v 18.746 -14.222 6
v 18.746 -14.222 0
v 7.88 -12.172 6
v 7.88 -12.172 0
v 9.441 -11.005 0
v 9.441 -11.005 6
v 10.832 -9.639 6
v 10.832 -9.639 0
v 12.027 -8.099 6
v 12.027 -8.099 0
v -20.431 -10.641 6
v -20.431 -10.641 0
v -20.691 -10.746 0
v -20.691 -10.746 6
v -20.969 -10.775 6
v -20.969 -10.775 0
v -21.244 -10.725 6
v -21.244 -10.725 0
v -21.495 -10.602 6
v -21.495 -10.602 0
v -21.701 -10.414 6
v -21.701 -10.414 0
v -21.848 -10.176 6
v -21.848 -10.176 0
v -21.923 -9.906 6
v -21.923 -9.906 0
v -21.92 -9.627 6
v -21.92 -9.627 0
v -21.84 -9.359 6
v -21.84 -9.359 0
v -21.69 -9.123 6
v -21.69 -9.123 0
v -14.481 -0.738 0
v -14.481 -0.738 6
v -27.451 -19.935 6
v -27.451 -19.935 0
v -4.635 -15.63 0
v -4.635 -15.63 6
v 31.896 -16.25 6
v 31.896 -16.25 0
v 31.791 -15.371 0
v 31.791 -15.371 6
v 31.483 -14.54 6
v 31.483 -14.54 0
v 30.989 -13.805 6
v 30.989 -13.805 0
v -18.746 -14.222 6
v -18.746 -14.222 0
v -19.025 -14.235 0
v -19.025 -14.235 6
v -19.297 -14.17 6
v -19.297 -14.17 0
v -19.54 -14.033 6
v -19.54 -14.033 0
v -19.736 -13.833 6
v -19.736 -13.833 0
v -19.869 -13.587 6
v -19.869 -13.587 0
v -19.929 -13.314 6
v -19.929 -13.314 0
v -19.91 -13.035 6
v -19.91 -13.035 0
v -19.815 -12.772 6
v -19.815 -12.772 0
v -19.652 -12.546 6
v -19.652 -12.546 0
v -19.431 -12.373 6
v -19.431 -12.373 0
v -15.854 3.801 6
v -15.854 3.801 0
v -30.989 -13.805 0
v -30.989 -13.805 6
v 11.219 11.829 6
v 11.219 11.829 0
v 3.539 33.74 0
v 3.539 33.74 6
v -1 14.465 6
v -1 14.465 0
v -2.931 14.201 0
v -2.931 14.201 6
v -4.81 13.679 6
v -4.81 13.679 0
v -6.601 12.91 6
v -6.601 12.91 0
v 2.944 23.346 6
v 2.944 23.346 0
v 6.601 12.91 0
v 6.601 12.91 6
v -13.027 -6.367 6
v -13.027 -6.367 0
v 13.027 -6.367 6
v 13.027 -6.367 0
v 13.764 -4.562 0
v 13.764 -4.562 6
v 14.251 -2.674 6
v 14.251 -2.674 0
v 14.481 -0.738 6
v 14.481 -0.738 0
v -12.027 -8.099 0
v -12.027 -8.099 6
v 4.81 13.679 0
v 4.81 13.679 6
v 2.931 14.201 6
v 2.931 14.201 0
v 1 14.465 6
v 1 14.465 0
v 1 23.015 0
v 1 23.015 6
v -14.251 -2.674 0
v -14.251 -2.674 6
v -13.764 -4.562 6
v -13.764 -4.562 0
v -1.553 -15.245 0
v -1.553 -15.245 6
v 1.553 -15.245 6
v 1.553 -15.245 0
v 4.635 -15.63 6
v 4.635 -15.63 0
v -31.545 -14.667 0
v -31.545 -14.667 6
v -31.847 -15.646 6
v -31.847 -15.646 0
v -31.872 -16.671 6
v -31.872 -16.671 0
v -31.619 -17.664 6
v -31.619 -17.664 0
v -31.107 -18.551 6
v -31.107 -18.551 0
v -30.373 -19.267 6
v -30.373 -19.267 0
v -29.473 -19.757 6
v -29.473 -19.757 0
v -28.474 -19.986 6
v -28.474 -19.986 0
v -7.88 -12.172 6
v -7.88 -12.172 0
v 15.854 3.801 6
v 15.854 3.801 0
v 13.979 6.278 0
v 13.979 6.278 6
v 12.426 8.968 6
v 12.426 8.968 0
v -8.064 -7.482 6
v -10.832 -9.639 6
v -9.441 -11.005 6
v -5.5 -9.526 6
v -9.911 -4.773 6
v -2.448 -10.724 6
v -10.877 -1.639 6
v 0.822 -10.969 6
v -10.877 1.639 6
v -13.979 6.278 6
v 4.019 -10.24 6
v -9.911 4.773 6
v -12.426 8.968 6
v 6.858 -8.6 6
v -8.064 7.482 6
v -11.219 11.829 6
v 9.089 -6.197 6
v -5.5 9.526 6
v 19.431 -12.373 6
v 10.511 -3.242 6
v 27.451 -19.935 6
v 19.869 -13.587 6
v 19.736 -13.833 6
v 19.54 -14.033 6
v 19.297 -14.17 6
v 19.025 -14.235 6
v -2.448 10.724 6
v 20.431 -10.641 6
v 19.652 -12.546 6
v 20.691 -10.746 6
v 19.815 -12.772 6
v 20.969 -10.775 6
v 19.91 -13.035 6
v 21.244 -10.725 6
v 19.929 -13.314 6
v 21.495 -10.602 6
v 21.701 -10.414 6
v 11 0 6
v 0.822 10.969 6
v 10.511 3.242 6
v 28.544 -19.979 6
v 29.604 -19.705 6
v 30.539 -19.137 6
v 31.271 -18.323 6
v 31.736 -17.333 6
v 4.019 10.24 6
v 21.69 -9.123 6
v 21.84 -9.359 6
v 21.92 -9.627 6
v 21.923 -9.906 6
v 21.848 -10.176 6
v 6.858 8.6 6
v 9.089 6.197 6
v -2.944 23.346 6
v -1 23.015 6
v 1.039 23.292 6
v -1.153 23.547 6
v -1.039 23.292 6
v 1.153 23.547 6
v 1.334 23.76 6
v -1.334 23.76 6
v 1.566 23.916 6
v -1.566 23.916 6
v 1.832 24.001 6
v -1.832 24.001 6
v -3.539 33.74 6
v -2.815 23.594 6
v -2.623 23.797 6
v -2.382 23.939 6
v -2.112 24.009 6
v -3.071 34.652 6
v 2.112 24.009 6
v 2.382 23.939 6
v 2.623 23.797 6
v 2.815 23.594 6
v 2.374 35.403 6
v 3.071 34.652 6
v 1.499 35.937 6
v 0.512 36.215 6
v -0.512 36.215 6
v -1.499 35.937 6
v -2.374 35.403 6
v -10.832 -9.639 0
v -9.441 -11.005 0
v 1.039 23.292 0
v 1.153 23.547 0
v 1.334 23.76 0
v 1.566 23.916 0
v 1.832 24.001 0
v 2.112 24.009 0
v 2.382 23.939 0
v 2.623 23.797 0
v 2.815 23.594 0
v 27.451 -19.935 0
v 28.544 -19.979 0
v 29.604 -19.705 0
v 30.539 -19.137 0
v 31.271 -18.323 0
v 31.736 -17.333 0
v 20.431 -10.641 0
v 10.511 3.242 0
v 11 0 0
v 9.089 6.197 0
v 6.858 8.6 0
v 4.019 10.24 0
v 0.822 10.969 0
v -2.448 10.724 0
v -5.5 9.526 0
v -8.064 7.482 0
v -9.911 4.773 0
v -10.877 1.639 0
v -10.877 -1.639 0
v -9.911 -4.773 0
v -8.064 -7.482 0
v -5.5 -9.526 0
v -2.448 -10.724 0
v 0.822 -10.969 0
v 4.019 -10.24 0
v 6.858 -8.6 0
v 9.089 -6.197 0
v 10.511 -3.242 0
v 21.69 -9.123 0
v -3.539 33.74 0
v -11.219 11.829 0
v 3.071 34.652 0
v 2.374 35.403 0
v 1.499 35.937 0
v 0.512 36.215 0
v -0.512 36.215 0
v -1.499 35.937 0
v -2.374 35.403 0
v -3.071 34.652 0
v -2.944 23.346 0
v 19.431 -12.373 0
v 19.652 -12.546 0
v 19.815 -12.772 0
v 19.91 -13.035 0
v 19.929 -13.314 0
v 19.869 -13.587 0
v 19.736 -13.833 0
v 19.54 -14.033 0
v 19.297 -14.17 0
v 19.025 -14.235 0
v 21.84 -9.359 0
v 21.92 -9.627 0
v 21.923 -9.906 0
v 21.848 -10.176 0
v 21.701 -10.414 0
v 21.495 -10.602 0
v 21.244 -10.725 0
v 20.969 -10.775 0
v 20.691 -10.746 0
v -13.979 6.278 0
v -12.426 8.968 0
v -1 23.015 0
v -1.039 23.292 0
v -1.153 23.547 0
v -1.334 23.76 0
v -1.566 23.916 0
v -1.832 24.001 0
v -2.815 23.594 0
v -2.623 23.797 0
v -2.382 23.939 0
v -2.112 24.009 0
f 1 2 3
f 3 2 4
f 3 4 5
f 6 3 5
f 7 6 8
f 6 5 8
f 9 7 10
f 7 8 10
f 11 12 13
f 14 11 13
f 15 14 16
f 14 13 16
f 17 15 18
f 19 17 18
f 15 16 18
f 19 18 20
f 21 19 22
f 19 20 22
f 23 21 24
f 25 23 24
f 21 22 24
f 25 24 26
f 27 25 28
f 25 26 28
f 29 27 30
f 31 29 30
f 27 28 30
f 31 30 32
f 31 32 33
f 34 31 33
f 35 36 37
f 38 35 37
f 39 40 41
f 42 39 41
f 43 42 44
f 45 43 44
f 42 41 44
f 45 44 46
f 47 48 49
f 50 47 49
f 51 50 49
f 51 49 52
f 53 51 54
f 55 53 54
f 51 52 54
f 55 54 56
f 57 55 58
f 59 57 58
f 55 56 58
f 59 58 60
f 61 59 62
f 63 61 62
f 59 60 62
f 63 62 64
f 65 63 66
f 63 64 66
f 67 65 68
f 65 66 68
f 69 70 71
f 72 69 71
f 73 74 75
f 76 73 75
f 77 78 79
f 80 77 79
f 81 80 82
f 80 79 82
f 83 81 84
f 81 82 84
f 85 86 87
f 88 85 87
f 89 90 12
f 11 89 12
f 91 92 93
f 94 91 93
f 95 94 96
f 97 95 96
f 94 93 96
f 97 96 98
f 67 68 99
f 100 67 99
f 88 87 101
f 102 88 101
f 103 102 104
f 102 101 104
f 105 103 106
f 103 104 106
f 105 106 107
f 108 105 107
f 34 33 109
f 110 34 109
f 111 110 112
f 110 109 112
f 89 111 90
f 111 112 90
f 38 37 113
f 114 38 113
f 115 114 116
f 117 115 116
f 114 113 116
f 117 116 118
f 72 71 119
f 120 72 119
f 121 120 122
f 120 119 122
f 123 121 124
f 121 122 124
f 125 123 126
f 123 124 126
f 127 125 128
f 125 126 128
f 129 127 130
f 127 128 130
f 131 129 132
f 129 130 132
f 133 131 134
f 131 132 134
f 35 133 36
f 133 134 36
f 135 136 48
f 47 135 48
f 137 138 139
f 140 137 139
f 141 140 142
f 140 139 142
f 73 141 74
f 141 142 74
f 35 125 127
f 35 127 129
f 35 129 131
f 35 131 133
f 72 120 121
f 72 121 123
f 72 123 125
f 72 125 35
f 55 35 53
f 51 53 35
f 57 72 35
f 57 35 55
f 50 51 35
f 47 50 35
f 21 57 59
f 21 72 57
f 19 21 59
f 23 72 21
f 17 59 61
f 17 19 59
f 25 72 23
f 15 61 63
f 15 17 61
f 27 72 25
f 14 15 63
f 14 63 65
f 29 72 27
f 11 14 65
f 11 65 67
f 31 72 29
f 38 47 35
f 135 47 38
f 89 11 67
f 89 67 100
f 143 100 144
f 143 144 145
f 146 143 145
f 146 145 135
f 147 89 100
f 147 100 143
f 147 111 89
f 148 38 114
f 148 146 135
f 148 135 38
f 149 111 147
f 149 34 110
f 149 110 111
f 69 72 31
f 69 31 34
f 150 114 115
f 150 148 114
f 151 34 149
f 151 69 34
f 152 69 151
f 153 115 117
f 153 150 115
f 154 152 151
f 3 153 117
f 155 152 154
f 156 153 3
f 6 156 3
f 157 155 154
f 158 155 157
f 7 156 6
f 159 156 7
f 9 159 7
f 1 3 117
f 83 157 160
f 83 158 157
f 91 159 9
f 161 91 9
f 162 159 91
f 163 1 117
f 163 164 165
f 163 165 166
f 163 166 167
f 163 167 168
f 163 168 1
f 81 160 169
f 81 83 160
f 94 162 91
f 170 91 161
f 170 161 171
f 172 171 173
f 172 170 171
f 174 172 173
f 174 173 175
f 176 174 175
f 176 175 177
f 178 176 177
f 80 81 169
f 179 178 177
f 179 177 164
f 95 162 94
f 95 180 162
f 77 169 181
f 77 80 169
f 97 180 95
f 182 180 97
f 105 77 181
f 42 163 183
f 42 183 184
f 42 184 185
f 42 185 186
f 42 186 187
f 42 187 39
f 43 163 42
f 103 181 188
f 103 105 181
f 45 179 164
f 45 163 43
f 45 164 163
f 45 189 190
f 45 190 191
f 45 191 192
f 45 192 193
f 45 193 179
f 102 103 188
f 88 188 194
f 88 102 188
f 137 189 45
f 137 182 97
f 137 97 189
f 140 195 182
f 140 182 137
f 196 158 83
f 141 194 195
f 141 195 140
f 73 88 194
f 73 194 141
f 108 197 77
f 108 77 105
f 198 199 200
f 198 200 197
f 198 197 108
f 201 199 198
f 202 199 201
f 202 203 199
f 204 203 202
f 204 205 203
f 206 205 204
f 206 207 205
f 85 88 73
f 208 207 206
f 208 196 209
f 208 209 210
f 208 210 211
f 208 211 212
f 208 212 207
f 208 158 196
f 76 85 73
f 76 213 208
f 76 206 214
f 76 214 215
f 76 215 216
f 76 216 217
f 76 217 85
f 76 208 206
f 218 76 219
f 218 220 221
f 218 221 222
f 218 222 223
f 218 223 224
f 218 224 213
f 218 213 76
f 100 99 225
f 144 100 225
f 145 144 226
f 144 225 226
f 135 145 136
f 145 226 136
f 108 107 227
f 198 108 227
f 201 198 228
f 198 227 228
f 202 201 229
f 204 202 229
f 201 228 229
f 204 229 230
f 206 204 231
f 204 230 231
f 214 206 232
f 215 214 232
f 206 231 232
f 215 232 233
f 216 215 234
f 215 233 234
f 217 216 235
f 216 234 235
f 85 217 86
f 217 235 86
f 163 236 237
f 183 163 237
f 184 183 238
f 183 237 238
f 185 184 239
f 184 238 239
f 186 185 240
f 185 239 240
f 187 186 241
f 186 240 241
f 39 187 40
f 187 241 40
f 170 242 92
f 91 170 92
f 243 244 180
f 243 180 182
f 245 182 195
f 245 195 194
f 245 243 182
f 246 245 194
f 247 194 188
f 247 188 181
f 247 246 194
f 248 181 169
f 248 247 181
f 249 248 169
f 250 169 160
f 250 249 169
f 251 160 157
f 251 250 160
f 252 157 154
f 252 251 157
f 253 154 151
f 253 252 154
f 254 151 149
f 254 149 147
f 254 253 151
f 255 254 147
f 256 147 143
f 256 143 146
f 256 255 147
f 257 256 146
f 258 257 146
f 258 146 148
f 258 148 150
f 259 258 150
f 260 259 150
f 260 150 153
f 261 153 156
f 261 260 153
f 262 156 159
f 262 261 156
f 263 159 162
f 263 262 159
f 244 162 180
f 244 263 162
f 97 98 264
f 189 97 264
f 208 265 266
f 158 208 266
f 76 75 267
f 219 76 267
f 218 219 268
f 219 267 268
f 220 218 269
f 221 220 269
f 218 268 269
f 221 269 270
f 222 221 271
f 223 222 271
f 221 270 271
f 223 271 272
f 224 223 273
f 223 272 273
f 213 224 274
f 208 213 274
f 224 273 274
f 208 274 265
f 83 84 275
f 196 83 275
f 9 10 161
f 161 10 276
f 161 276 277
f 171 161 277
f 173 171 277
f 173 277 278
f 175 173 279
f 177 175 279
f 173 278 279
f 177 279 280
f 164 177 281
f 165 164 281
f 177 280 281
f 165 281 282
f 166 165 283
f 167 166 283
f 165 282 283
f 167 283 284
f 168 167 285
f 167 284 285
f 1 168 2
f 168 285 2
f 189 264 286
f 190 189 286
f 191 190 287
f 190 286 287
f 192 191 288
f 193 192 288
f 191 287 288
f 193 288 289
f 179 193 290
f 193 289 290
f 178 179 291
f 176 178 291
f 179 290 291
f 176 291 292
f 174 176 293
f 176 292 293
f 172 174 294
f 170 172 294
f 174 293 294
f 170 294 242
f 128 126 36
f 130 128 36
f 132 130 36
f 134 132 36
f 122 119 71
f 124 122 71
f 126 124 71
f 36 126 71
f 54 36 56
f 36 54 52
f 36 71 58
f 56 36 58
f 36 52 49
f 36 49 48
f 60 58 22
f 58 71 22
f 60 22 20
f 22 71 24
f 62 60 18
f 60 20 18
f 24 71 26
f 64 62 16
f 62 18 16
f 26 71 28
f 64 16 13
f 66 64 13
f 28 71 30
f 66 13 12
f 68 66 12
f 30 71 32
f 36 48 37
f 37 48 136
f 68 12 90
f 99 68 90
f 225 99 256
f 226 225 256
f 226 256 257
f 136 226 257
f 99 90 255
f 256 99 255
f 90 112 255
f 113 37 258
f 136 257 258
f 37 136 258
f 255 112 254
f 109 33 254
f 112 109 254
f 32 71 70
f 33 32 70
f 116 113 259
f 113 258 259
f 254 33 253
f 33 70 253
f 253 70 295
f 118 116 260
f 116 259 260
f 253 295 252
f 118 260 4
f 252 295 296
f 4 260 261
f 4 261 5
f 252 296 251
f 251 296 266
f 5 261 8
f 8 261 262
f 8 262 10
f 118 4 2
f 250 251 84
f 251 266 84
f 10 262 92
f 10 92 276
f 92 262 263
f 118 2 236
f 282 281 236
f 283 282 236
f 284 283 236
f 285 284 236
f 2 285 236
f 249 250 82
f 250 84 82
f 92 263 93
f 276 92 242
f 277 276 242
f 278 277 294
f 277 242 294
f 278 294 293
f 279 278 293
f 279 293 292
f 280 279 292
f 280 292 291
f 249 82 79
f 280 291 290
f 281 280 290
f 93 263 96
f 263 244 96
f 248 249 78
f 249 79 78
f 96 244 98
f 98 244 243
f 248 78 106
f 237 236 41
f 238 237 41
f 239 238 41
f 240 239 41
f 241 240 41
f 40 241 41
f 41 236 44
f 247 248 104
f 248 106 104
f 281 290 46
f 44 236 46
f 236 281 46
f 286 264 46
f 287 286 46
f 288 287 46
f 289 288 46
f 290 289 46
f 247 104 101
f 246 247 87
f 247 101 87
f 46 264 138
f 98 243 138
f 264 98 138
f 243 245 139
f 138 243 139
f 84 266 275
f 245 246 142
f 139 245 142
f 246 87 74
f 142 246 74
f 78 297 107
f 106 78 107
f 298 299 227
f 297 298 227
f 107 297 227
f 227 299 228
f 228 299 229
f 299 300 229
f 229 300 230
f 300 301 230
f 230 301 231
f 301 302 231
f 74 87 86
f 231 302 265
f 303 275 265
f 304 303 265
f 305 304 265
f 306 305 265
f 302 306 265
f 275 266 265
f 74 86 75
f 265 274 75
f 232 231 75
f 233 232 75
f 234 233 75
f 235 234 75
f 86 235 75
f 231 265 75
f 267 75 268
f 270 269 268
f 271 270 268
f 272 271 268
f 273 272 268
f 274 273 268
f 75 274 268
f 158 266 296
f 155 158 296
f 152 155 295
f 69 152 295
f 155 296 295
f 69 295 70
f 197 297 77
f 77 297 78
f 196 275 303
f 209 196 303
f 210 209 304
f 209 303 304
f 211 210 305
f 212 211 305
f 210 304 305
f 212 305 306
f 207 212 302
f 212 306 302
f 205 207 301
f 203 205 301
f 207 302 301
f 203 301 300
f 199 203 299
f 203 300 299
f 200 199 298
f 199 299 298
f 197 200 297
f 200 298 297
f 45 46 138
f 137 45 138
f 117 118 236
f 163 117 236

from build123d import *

# Parameters (mm, degrees)
F0_R     = 11
F1_DEPTH = 6


with BuildPart() as f1:
    # F0 (on Top) → F1 (new body)
    with BuildSketch(Plane.XY):
        with BuildLine():
            Line((11.2187429189, 11.8292181419), (3.5389187623, 33.7403846154))
            ThreePointArc((3.5389187623, 33.7403846154), (0, 36.25), (-3.5389187623, 33.7403846154))
            Line((-3.5389187623, 33.7403846154), (-11.2187429189, 11.8292181419))
            ThreePointArc((-11.2187429189, 11.8292181419), (-13.1608995727, 7.5984489111), (-15.8537748772, 3.8011072954))
            Line((-15.8537748772, 3.8011072954), (-30.9894895915, -13.8053987576))
            ThreePointArc((-30.9894895915, -13.8053987576), (-28.3703151015, -12.5067254343), (-25.6147048476, -13.4830653025))
            ThreePointArc((-25.6147048476, -13.4830653025), (-24.8982303588, -14.375), (-24.4840294966, -15.4414524572))
            ThreePointArc((-24.4840294966, -15.4414524572), (-24.4179418082, -15.8433278187), (-24.395825623, -16.25))
            ThreePointArc((-24.395825623, -16.25), (-25.2588111204, -18.643250355), (-27.4505708292, -19.9349858577))
            Line((-27.4505708292, -19.9349858577), (-4.6350319583, -15.6303254372))
            ThreePointArc((-4.6350319583, -15.6303254372), (0, -15.1968978222), (4.6350319583, -15.6303254372))
            Line((4.6350319583, -15.6303254372), (27.4505708292, -19.9349858577))
            ThreePointArc((27.4505708292, -19.9349858577), (25.016299495, -18.3160508741), (24.4840294966, -15.4414524572))
            ThreePointArc((24.4840294966, -15.4414524572), (24.8982303588, -14.375), (25.6147048476, -13.4830653025))
            ThreePointArc((25.6147048476, -13.4830653025), (28.3703151015, -12.5067254343), (30.9894895915, -13.8053987576))
            Line((30.9894895915, -13.8053987576), (15.8537748772, 3.8011072954))
            ThreePointArc((15.8537748772, 3.8011072954), (13.1608995727, 7.5984489111), (11.2187429189, 11.8292181419))
        make_face()
        with BuildLine():
            Line((-19.4313725784, -12.3734087272), (-12.0274698164, -8.0987634745))
            ThreePointArc((-12.0274698164, -8.0987634745), (-10.1599093098, -10.3453488494), (-7.8799155315, -12.171973185))
            Line((-7.8799155315, -12.171973185), (-18.7459713, -14.2220970264))
            ThreePointArc((-18.7459713, -14.2220970264), (-19.8690053401, -13.5870615238), (-19.4313725784, -12.3734087272))
        make_face(mode=Mode.SUBTRACT)
        with BuildLine():
            ThreePointArc((-20.4313725784, -10.6413579197), (-21.7012431124, -10.4135326105), (-21.68968297, -9.1234388512))
            Line((-21.68968297, -9.1234388512), (-14.4811957581, -0.7382204374))
            ThreePointArc((-14.4811957581, -0.7382204374), (-14.0392895695, -3.6260651377), (-13.0274698164, -6.366712667))
            Line((-13.0274698164, -6.366712667), (-20.4313725784, -10.6413579197))
        make_face(mode=Mode.SUBTRACT)
        with BuildLine():
            ThreePointArc((19.4313725784, -12.3734087272), (19.8690053401, -13.5870615238), (18.7459713, -14.2220970264))
            Line((18.7459713, -14.2220970264), (7.8799155315, -12.171973185))
            ThreePointArc((7.8799155315, -12.171973185), (10.1599093098, -10.3453488494), (12.0274698164, -8.0987634745))
            Line((12.0274698164, -8.0987634745), (19.4313725784, -12.3734087272))
        make_face(mode=Mode.SUBTRACT)
        Circle(F0_R, mode=Mode.SUBTRACT)
        with BuildLine():
            Line((14.4811957581, -0.7382204374), (21.68968297, -9.1234388512))
            ThreePointArc((21.68968297, -9.1234388512), (21.7012431124, -10.4135326105), (20.4313725784, -10.6413579197))
            Line((20.4313725784, -10.6413579197), (13.0274698164, -6.366712667))
            ThreePointArc((13.0274698164, -6.366712667), (14.0392895695, -3.6260651377), (14.4811957581, -0.7382204374))
        make_face(mode=Mode.SUBTRACT)
        with BuildLine():
            Line((-6.6012802267, 12.9101936225), (-2.9437116699, 23.3455358777))
            ThreePointArc((-2.9437116699, 23.3455358777), (-1.8322377723, 24.0005941343), (-1, 23.0147666469))
            Line((-1, 23.0147666469), (-1, 14.4654761415))
            ThreePointArc((-1, 14.4654761415), (-3.8793802597, 13.9714139872), (-6.6012802267, 12.9101936225))
        make_face(mode=Mode.SUBTRACT)
        with BuildLine():
            ThreePointArc((1, 23.0147666469), (1.8322377723, 24.0005941343), (2.9437116699, 23.3455358777))
            Line((2.9437116699, 23.3455358777), (6.6012802267, 12.9101936225))
            ThreePointArc((6.6012802267, 12.9101936225), (3.8793802597, 13.9714139872), (1, 14.4654761415))
            Line((1, 14.4654761415), (1, 23.0147666469))
        make_face(mode=Mode.SUBTRACT)
        with BuildLine():
            ThreePointArc((-25.6147048476, -13.4830653025), (-28.3703151015, -12.5067254343), (-30.9894895915, -13.8053987576))
            ThreePointArc((-30.9894895915, -13.8053987576), (-31.3934208872, -18.125), (-27.4505708292, -19.9349858577))
            ThreePointArc((-27.4505708292, -19.9349858577), (-25.2588111204, -18.643250355), (-24.395825623, -16.25))
            ThreePointArc((-24.395825623, -16.25), (-24.4179418082, -15.8433278187), (-24.4840294966, -15.4414524572))
            ThreePointArc((-24.4840294966, -15.4414524572), (-24.8982303588, -14.375), (-25.6147048476, -13.4830653025))
        make_face()
        with BuildLine():
            ThreePointArc((31.895825623, -16.25), (31.6619484793, -14.9463972771), (30.9894895915, -13.8053987576))
            ThreePointArc((30.9894895915, -13.8053987576), (28.3703151015, -12.5067254343), (25.6147048476, -13.4830653025))
            ThreePointArc((25.6147048476, -13.4830653025), (24.8982303588, -14.375), (24.4840294966, -15.4414524572))
            ThreePointArc((24.4840294966, -15.4414524572), (25.016299495, -18.3160508741), (27.4505708292, -19.9349858577))
            ThreePointArc((27.4505708292, -19.9349858577), (30.539075978, -19.1370145026), (31.895825623, -16.25))
        make_face()
    extrude(amount=F1_DEPTH)


solid = f1.part
